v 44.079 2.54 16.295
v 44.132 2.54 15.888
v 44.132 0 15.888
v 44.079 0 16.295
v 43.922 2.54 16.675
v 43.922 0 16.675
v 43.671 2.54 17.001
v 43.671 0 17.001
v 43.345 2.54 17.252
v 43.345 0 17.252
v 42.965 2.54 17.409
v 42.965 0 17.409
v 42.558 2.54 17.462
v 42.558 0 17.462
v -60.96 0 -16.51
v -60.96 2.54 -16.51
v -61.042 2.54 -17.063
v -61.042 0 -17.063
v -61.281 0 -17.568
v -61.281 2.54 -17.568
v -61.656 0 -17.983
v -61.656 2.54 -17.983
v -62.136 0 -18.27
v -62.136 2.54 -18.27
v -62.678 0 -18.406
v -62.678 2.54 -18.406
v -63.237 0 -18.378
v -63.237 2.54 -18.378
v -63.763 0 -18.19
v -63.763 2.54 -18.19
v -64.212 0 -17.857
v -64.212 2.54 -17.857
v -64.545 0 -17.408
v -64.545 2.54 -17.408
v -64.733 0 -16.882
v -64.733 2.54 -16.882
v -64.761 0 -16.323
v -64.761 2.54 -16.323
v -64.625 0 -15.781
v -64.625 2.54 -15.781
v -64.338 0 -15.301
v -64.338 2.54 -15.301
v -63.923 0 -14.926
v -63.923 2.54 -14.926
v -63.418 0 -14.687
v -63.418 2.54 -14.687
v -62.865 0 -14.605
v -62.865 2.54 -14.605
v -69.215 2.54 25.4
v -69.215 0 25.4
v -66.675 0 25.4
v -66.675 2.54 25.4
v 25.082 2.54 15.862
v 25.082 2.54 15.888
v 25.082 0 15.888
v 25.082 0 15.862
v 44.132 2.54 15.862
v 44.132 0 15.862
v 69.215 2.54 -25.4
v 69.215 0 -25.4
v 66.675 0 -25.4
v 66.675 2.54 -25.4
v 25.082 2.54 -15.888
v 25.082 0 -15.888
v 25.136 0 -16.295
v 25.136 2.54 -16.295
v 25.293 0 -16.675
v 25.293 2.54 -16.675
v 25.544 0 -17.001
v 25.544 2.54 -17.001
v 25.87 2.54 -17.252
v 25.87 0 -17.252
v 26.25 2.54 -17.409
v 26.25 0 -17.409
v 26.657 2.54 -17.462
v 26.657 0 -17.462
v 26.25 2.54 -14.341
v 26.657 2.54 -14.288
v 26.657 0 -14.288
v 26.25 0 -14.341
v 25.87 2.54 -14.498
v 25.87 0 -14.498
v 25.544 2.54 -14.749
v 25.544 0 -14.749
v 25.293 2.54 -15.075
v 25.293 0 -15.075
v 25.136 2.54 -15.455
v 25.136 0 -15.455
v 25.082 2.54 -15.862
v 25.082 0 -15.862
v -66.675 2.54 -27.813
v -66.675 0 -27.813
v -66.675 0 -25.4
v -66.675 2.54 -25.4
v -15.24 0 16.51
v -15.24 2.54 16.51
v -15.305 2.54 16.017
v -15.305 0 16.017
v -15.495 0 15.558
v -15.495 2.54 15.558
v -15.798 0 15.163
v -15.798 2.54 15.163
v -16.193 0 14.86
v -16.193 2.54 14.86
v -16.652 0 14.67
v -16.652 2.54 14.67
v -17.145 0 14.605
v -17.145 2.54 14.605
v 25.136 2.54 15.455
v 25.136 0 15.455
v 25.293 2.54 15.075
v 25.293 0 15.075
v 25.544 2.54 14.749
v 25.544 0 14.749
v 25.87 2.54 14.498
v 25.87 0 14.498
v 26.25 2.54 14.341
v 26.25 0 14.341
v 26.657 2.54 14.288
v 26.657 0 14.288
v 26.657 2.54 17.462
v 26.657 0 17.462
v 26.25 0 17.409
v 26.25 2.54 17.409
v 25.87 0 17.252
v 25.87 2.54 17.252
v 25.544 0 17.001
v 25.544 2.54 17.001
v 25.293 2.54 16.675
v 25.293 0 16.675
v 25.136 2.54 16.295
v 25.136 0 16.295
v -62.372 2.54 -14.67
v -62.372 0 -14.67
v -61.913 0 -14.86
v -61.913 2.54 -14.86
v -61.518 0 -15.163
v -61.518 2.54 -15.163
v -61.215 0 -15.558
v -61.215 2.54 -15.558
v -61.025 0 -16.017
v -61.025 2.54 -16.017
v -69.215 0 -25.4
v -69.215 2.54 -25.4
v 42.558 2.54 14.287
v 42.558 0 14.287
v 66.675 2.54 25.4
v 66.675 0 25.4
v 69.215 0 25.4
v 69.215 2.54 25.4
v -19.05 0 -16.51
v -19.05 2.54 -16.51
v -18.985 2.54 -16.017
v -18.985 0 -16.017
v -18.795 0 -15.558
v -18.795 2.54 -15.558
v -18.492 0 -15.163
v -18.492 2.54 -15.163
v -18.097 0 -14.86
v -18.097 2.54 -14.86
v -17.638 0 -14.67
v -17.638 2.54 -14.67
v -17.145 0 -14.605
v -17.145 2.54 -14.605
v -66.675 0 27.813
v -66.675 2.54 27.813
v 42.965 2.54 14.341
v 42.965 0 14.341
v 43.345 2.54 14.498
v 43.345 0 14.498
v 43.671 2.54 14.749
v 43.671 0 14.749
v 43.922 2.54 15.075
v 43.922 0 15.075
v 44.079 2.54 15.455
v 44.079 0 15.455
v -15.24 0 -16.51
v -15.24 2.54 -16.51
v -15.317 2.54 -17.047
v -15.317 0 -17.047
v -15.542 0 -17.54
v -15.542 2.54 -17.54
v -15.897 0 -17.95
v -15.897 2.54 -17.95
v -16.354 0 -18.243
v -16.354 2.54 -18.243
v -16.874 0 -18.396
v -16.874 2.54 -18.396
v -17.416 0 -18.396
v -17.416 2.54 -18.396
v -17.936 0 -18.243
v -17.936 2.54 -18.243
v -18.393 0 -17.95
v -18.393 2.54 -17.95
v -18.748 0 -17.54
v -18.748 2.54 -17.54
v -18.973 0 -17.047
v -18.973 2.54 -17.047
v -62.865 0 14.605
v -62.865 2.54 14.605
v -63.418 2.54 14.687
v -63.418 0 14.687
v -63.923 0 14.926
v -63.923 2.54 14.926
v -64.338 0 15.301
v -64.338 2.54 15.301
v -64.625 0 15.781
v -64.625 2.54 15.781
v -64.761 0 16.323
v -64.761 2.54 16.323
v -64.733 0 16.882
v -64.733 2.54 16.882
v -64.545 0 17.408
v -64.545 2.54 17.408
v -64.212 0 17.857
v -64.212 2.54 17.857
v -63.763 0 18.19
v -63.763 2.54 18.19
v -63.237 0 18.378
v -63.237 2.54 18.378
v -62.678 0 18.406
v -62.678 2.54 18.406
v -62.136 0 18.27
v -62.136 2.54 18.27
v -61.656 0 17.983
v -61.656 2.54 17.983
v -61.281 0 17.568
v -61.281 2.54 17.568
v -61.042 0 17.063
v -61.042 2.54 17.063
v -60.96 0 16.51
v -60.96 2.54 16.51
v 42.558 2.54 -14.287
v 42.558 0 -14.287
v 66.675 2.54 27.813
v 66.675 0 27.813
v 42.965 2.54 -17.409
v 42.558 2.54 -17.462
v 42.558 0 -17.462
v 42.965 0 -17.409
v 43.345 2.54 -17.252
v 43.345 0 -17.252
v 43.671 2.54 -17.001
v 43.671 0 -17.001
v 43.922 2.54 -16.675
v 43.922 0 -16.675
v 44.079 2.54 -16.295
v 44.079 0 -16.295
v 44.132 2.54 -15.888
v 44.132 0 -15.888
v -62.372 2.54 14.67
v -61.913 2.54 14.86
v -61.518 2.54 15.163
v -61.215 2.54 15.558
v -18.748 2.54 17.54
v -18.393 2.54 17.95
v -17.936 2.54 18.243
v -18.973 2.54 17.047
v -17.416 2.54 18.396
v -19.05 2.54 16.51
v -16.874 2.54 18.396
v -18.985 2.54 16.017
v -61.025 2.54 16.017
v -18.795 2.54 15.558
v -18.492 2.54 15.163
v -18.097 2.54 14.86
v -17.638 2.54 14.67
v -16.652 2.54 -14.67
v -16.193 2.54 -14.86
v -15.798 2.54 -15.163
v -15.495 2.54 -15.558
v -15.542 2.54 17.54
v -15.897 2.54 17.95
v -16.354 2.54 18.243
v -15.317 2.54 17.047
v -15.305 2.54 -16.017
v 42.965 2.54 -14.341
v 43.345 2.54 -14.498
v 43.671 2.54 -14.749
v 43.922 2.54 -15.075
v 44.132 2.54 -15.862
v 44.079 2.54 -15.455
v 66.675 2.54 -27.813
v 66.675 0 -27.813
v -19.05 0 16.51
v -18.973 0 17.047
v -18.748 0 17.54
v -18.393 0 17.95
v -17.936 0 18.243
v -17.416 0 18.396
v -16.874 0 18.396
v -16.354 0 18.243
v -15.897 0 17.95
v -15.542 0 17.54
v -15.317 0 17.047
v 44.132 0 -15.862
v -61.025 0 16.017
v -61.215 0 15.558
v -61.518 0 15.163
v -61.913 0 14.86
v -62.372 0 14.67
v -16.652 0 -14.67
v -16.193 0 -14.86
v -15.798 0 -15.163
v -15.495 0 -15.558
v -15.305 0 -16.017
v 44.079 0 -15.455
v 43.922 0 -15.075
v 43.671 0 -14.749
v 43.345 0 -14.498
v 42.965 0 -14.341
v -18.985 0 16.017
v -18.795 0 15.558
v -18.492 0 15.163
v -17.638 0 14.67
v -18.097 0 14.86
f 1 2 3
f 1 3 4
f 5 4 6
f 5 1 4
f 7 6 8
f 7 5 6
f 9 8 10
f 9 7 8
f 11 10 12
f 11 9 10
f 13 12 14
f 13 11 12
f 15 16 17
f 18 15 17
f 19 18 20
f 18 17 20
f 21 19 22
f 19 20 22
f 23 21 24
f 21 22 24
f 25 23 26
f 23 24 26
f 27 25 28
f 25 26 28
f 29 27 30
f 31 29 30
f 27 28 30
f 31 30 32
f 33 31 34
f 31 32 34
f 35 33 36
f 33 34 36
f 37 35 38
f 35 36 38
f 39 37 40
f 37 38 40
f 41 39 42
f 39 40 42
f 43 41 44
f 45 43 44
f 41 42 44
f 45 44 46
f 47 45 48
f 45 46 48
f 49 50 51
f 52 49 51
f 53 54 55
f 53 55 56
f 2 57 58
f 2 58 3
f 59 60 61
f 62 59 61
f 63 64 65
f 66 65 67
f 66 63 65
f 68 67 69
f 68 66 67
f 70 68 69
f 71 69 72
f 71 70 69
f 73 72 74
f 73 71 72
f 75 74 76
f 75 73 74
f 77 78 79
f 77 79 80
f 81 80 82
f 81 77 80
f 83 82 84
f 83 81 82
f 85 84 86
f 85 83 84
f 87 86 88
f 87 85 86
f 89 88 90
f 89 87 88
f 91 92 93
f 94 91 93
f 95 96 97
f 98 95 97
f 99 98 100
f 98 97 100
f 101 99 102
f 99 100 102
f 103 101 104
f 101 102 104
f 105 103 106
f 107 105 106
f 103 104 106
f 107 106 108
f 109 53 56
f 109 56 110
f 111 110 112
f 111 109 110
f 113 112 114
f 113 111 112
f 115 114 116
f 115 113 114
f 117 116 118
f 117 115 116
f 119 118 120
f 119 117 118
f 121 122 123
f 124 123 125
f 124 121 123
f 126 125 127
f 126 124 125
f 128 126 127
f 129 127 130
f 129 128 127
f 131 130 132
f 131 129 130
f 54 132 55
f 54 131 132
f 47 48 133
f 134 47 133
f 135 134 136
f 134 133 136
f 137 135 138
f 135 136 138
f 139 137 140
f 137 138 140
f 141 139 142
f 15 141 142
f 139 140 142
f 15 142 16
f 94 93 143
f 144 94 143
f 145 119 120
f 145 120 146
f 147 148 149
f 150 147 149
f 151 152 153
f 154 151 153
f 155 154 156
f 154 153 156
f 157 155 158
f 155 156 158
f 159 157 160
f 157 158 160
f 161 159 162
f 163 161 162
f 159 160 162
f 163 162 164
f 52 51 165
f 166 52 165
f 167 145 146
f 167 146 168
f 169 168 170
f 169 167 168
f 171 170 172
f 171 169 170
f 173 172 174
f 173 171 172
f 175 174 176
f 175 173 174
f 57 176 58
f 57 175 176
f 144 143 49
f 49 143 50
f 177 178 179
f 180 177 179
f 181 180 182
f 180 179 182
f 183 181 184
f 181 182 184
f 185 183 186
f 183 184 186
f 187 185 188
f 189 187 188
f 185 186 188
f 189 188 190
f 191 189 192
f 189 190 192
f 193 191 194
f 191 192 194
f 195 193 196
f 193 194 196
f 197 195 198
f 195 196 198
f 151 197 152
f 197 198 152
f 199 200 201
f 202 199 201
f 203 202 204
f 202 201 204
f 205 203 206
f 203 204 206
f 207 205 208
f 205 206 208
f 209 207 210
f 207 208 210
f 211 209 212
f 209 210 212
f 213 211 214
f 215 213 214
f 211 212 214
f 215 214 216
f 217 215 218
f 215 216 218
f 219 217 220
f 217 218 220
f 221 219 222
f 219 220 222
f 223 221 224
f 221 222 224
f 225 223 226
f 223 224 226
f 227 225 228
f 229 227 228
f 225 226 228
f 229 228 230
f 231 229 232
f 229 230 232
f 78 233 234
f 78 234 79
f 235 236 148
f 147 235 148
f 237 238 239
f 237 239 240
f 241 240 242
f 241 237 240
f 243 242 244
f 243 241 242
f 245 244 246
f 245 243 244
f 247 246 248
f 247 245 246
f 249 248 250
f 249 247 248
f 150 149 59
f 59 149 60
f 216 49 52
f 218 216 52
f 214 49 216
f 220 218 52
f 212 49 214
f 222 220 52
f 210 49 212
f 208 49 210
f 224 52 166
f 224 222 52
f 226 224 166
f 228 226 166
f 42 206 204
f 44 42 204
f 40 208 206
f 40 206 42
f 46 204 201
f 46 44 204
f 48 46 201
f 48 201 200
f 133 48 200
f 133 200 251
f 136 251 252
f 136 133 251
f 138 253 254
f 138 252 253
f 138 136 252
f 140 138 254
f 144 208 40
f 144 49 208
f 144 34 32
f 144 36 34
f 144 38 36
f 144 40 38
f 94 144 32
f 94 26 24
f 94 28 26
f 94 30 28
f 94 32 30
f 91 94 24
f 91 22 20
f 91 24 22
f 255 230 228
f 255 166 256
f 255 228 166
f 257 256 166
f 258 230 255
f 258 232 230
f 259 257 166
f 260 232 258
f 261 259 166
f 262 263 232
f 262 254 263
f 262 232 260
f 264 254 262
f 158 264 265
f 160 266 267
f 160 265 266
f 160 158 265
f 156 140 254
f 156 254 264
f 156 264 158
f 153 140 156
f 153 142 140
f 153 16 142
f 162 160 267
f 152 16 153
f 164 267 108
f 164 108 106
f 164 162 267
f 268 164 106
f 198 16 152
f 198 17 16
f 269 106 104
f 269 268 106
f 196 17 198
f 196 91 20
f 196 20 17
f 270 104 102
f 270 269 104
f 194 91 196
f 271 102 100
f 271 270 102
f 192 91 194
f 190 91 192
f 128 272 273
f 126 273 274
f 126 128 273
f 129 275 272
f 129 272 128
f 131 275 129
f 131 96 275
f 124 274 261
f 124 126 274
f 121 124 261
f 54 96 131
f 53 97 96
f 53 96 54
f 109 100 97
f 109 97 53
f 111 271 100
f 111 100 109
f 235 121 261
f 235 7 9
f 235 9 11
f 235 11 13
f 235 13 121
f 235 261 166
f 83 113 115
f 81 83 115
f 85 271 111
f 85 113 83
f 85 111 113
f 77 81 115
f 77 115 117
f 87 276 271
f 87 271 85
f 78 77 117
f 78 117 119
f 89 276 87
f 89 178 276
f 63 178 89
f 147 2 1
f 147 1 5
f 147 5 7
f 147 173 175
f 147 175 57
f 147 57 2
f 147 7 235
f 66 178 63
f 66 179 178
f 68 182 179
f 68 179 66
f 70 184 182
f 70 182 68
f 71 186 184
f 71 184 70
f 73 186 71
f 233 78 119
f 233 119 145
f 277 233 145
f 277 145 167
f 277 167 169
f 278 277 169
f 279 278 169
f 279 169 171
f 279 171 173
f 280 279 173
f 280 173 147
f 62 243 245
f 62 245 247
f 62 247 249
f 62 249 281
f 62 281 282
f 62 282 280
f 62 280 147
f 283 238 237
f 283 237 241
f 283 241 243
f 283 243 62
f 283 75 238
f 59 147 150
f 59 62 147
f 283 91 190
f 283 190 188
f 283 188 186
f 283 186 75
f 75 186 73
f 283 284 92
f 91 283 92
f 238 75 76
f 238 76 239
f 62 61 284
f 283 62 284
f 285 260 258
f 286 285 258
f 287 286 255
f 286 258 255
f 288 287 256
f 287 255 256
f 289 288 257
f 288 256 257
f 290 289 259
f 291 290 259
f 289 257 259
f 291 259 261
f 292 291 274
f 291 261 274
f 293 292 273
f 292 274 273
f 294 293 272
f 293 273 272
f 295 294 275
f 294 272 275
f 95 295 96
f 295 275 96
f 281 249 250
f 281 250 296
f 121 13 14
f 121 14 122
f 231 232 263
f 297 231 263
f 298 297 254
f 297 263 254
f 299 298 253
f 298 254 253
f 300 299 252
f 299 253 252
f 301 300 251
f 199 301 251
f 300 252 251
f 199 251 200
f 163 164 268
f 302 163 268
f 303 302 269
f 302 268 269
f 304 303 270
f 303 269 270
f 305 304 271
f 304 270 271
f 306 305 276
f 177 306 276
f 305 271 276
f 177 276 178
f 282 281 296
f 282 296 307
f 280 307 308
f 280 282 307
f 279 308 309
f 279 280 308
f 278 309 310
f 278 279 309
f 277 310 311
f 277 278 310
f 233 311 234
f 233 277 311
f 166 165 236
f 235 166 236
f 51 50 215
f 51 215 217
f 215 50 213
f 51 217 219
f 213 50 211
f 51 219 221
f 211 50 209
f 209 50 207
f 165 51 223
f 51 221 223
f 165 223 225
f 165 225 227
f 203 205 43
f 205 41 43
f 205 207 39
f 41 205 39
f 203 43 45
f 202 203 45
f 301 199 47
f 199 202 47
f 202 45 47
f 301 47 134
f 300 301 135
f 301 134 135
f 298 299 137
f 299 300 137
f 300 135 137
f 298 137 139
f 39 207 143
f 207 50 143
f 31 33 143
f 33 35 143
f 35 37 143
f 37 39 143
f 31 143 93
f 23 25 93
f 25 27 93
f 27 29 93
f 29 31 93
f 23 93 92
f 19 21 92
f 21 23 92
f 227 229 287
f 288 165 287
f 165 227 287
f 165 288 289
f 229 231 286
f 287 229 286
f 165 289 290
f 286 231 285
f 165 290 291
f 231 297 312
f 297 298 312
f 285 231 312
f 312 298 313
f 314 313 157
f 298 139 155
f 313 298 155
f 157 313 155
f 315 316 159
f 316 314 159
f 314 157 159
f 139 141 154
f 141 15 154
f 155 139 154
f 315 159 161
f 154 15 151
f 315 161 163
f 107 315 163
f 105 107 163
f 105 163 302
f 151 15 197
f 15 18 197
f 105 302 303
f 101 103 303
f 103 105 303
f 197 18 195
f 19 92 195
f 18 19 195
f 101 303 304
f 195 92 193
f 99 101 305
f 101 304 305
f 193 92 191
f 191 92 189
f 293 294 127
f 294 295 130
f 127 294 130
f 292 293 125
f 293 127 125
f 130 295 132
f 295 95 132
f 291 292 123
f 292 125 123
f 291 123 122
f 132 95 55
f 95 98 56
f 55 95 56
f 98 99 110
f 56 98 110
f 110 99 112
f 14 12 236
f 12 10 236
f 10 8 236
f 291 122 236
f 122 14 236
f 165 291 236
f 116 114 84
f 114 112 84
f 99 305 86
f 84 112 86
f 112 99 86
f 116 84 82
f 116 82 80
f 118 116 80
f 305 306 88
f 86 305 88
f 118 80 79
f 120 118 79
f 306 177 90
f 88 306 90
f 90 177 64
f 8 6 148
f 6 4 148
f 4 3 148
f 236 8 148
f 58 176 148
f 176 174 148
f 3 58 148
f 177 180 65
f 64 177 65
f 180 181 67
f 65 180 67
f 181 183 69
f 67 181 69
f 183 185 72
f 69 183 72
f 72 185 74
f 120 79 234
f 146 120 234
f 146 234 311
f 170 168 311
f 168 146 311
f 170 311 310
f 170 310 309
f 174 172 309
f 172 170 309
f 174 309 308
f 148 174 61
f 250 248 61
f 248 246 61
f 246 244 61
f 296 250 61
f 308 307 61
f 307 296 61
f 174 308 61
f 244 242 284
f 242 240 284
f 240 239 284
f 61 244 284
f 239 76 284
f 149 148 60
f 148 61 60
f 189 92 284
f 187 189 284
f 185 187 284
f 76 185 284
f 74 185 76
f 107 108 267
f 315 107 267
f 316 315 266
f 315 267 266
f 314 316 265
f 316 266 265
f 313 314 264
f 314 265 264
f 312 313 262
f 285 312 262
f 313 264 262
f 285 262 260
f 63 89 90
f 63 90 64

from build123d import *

# Parameters (mm, degrees)
BOSS_EXTRUDE1_DEPTH = 2.54
CUT_EXTRUDE1_DEPTH  = 3.54
CUT_EXTRUDE2_DEPTH  = 3.54


with BuildPart() as part:
    # Sketch1 → Boss-Extrude1 (new body)
    with BuildSketch(Plane(origin=(0, 0, 0), x_dir=(1, 0, 0), z_dir=(0, 1, 0))):
        Polygon((-66.675, 25.4), (-69.215, 25.4), (-69.215, -25.4), (-66.675, -25.4), (-66.675, -27.813), (66.675, -27.813), (66.675, -25.4), (69.215, -25.4), (69.215, 25.4), (66.675, 25.4), (66.675, 27.813), (-66.675, 27.813), align=None)
    extrude(amount=BOSS_EXTRUDE1_DEPTH)

    # Sketch2 → Cut-Extrude1 (cut, through all)
    with BuildSketch(Plane(origin=(0, 2.54, 0), x_dir=(1, 0, 0), z_dir=(0, 1, 0))):
        with BuildLine():
            ThreePointArc((-60.96, 16.51), (-64.212038418, 17.857038418), (-62.865, 14.605))
            Line((-62.865, 14.605), (-62.865, 16.51))
            Line((-62.865, 16.51), (-60.96, 16.51))
        make_face()
        with BuildLine():
            Line((-62.865, 16.51), (-62.865, 14.605))
            ThreePointArc((-62.865, 14.605), (-61.517961582, 15.162961582), (-60.96, 16.51))
            Line((-60.96, 16.51), (-62.865, 16.51))
        make_face()
        with BuildLine():
            ThreePointArc((-19.05, 16.51), (-18.492038418, 15.162961582), (-17.145, 14.605))
            Line((-17.145, 14.605), (-17.145, 16.51))
            Line((-17.145, 16.51), (-19.05, 16.51))
        make_face()
        with BuildLine():
            Line((-17.145, 16.51), (-17.145, 14.605))
            ThreePointArc((-17.145, 14.605), (-15.797961582, 15.162961582), (-15.24, 16.51))
            ThreePointArc((-15.24, 16.51), (-17.145, 18.415), (-19.05, 16.51))
            Line((-19.05, 16.51), (-17.145, 16.51))
        make_face()
        with BuildLine():
            ThreePointArc((-17.145, -14.605), (-18.492038418, -15.162961582), (-19.05, -16.51))
            Line((-19.05, -16.51), (-17.145, -16.51))
            Line((-17.145, -16.51), (-17.145, -14.605))
        make_face()
        with BuildLine():
            Line((-17.145, -16.51), (-19.05, -16.51))
            ThreePointArc((-19.05, -16.51), (-17.145, -18.415), (-15.24, -16.51))
            ThreePointArc((-15.24, -16.51), (-15.797961582, -15.162961582), (-17.145, -14.605))
            Line((-17.145, -14.605), (-17.145, -16.51))
        make_face()
        with BuildLine():
            Line((-62.865, -14.605), (-62.865, -16.51))
            Line((-62.865, -16.51), (-60.96, -16.51))
            ThreePointArc((-60.96, -16.51), (-61.517961582, -15.162961582), (-62.865, -14.605))
        make_face()
        with BuildLine():
            Line((-60.96, -16.51), (-62.865, -16.51))
            Line((-62.865, -16.51), (-62.865, -14.605))
            ThreePointArc((-62.865, -14.605), (-64.212038418, -17.857038418), (-60.96, -16.51))
        make_face()
    extrude(amount=-CUT_EXTRUDE1_DEPTH, mode=Mode.SUBTRACT)

    # Sketch3 → Cut-Extrude2 (cut, through all)
    with BuildSketch(Plane(origin=(0, 2.54, 0), x_dir=(1, 0, 0), z_dir=(0, 1, 0))):
        with BuildLine():
            Line((44.1325, 15.8877), (44.1325, 15.8623))
            ThreePointArc((44.1325, 15.8623), (43.671251759, 14.748748241), (42.5577, 14.2875))
            Line((42.5577, 14.2875), (26.6573, 14.2875))
            ThreePointArc((26.6573, 14.2875), (25.543748241, 14.748748241), (25.0825, 15.8623))
            Line((25.0825, 15.8623), (25.0825, 15.8877))
            ThreePointArc((25.0825, 15.8877), (25.543748241, 17.001251759), (26.6573, 17.4625))
            Line((26.6573, 17.4625), (42.5577, 17.4625))
            ThreePointArc((42.5577, 17.4625), (43.671251759, 17.001251759), (44.1325, 15.8877))
        make_face()
        with BuildLine():
            Line((42.5577, -17.4625), (26.6573, -17.4625))
            ThreePointArc((26.6573, -17.4625), (25.543748241, -17.001251759), (25.0825, -15.8877))
            Line((25.0825, -15.8877), (25.0825, -15.8623))
            ThreePointArc((25.0825, -15.8623), (25.543748241, -14.748748241), (26.6573, -14.2875))
            Line((26.6573, -14.2875), (42.5577, -14.2875))
            ThreePointArc((42.5577, -14.2875), (43.671251759, -14.748748241), (44.1325, -15.8623))
            Line((44.1325, -15.8623), (44.1325, -15.8877))
            ThreePointArc((44.1325, -15.8877), (43.671251759, -17.001251759), (42.5577, -17.4625))
        make_face()
    extrude(amount=-CUT_EXTRUDE2_DEPTH, mode=Mode.SUBTRACT)


solid = part.part
